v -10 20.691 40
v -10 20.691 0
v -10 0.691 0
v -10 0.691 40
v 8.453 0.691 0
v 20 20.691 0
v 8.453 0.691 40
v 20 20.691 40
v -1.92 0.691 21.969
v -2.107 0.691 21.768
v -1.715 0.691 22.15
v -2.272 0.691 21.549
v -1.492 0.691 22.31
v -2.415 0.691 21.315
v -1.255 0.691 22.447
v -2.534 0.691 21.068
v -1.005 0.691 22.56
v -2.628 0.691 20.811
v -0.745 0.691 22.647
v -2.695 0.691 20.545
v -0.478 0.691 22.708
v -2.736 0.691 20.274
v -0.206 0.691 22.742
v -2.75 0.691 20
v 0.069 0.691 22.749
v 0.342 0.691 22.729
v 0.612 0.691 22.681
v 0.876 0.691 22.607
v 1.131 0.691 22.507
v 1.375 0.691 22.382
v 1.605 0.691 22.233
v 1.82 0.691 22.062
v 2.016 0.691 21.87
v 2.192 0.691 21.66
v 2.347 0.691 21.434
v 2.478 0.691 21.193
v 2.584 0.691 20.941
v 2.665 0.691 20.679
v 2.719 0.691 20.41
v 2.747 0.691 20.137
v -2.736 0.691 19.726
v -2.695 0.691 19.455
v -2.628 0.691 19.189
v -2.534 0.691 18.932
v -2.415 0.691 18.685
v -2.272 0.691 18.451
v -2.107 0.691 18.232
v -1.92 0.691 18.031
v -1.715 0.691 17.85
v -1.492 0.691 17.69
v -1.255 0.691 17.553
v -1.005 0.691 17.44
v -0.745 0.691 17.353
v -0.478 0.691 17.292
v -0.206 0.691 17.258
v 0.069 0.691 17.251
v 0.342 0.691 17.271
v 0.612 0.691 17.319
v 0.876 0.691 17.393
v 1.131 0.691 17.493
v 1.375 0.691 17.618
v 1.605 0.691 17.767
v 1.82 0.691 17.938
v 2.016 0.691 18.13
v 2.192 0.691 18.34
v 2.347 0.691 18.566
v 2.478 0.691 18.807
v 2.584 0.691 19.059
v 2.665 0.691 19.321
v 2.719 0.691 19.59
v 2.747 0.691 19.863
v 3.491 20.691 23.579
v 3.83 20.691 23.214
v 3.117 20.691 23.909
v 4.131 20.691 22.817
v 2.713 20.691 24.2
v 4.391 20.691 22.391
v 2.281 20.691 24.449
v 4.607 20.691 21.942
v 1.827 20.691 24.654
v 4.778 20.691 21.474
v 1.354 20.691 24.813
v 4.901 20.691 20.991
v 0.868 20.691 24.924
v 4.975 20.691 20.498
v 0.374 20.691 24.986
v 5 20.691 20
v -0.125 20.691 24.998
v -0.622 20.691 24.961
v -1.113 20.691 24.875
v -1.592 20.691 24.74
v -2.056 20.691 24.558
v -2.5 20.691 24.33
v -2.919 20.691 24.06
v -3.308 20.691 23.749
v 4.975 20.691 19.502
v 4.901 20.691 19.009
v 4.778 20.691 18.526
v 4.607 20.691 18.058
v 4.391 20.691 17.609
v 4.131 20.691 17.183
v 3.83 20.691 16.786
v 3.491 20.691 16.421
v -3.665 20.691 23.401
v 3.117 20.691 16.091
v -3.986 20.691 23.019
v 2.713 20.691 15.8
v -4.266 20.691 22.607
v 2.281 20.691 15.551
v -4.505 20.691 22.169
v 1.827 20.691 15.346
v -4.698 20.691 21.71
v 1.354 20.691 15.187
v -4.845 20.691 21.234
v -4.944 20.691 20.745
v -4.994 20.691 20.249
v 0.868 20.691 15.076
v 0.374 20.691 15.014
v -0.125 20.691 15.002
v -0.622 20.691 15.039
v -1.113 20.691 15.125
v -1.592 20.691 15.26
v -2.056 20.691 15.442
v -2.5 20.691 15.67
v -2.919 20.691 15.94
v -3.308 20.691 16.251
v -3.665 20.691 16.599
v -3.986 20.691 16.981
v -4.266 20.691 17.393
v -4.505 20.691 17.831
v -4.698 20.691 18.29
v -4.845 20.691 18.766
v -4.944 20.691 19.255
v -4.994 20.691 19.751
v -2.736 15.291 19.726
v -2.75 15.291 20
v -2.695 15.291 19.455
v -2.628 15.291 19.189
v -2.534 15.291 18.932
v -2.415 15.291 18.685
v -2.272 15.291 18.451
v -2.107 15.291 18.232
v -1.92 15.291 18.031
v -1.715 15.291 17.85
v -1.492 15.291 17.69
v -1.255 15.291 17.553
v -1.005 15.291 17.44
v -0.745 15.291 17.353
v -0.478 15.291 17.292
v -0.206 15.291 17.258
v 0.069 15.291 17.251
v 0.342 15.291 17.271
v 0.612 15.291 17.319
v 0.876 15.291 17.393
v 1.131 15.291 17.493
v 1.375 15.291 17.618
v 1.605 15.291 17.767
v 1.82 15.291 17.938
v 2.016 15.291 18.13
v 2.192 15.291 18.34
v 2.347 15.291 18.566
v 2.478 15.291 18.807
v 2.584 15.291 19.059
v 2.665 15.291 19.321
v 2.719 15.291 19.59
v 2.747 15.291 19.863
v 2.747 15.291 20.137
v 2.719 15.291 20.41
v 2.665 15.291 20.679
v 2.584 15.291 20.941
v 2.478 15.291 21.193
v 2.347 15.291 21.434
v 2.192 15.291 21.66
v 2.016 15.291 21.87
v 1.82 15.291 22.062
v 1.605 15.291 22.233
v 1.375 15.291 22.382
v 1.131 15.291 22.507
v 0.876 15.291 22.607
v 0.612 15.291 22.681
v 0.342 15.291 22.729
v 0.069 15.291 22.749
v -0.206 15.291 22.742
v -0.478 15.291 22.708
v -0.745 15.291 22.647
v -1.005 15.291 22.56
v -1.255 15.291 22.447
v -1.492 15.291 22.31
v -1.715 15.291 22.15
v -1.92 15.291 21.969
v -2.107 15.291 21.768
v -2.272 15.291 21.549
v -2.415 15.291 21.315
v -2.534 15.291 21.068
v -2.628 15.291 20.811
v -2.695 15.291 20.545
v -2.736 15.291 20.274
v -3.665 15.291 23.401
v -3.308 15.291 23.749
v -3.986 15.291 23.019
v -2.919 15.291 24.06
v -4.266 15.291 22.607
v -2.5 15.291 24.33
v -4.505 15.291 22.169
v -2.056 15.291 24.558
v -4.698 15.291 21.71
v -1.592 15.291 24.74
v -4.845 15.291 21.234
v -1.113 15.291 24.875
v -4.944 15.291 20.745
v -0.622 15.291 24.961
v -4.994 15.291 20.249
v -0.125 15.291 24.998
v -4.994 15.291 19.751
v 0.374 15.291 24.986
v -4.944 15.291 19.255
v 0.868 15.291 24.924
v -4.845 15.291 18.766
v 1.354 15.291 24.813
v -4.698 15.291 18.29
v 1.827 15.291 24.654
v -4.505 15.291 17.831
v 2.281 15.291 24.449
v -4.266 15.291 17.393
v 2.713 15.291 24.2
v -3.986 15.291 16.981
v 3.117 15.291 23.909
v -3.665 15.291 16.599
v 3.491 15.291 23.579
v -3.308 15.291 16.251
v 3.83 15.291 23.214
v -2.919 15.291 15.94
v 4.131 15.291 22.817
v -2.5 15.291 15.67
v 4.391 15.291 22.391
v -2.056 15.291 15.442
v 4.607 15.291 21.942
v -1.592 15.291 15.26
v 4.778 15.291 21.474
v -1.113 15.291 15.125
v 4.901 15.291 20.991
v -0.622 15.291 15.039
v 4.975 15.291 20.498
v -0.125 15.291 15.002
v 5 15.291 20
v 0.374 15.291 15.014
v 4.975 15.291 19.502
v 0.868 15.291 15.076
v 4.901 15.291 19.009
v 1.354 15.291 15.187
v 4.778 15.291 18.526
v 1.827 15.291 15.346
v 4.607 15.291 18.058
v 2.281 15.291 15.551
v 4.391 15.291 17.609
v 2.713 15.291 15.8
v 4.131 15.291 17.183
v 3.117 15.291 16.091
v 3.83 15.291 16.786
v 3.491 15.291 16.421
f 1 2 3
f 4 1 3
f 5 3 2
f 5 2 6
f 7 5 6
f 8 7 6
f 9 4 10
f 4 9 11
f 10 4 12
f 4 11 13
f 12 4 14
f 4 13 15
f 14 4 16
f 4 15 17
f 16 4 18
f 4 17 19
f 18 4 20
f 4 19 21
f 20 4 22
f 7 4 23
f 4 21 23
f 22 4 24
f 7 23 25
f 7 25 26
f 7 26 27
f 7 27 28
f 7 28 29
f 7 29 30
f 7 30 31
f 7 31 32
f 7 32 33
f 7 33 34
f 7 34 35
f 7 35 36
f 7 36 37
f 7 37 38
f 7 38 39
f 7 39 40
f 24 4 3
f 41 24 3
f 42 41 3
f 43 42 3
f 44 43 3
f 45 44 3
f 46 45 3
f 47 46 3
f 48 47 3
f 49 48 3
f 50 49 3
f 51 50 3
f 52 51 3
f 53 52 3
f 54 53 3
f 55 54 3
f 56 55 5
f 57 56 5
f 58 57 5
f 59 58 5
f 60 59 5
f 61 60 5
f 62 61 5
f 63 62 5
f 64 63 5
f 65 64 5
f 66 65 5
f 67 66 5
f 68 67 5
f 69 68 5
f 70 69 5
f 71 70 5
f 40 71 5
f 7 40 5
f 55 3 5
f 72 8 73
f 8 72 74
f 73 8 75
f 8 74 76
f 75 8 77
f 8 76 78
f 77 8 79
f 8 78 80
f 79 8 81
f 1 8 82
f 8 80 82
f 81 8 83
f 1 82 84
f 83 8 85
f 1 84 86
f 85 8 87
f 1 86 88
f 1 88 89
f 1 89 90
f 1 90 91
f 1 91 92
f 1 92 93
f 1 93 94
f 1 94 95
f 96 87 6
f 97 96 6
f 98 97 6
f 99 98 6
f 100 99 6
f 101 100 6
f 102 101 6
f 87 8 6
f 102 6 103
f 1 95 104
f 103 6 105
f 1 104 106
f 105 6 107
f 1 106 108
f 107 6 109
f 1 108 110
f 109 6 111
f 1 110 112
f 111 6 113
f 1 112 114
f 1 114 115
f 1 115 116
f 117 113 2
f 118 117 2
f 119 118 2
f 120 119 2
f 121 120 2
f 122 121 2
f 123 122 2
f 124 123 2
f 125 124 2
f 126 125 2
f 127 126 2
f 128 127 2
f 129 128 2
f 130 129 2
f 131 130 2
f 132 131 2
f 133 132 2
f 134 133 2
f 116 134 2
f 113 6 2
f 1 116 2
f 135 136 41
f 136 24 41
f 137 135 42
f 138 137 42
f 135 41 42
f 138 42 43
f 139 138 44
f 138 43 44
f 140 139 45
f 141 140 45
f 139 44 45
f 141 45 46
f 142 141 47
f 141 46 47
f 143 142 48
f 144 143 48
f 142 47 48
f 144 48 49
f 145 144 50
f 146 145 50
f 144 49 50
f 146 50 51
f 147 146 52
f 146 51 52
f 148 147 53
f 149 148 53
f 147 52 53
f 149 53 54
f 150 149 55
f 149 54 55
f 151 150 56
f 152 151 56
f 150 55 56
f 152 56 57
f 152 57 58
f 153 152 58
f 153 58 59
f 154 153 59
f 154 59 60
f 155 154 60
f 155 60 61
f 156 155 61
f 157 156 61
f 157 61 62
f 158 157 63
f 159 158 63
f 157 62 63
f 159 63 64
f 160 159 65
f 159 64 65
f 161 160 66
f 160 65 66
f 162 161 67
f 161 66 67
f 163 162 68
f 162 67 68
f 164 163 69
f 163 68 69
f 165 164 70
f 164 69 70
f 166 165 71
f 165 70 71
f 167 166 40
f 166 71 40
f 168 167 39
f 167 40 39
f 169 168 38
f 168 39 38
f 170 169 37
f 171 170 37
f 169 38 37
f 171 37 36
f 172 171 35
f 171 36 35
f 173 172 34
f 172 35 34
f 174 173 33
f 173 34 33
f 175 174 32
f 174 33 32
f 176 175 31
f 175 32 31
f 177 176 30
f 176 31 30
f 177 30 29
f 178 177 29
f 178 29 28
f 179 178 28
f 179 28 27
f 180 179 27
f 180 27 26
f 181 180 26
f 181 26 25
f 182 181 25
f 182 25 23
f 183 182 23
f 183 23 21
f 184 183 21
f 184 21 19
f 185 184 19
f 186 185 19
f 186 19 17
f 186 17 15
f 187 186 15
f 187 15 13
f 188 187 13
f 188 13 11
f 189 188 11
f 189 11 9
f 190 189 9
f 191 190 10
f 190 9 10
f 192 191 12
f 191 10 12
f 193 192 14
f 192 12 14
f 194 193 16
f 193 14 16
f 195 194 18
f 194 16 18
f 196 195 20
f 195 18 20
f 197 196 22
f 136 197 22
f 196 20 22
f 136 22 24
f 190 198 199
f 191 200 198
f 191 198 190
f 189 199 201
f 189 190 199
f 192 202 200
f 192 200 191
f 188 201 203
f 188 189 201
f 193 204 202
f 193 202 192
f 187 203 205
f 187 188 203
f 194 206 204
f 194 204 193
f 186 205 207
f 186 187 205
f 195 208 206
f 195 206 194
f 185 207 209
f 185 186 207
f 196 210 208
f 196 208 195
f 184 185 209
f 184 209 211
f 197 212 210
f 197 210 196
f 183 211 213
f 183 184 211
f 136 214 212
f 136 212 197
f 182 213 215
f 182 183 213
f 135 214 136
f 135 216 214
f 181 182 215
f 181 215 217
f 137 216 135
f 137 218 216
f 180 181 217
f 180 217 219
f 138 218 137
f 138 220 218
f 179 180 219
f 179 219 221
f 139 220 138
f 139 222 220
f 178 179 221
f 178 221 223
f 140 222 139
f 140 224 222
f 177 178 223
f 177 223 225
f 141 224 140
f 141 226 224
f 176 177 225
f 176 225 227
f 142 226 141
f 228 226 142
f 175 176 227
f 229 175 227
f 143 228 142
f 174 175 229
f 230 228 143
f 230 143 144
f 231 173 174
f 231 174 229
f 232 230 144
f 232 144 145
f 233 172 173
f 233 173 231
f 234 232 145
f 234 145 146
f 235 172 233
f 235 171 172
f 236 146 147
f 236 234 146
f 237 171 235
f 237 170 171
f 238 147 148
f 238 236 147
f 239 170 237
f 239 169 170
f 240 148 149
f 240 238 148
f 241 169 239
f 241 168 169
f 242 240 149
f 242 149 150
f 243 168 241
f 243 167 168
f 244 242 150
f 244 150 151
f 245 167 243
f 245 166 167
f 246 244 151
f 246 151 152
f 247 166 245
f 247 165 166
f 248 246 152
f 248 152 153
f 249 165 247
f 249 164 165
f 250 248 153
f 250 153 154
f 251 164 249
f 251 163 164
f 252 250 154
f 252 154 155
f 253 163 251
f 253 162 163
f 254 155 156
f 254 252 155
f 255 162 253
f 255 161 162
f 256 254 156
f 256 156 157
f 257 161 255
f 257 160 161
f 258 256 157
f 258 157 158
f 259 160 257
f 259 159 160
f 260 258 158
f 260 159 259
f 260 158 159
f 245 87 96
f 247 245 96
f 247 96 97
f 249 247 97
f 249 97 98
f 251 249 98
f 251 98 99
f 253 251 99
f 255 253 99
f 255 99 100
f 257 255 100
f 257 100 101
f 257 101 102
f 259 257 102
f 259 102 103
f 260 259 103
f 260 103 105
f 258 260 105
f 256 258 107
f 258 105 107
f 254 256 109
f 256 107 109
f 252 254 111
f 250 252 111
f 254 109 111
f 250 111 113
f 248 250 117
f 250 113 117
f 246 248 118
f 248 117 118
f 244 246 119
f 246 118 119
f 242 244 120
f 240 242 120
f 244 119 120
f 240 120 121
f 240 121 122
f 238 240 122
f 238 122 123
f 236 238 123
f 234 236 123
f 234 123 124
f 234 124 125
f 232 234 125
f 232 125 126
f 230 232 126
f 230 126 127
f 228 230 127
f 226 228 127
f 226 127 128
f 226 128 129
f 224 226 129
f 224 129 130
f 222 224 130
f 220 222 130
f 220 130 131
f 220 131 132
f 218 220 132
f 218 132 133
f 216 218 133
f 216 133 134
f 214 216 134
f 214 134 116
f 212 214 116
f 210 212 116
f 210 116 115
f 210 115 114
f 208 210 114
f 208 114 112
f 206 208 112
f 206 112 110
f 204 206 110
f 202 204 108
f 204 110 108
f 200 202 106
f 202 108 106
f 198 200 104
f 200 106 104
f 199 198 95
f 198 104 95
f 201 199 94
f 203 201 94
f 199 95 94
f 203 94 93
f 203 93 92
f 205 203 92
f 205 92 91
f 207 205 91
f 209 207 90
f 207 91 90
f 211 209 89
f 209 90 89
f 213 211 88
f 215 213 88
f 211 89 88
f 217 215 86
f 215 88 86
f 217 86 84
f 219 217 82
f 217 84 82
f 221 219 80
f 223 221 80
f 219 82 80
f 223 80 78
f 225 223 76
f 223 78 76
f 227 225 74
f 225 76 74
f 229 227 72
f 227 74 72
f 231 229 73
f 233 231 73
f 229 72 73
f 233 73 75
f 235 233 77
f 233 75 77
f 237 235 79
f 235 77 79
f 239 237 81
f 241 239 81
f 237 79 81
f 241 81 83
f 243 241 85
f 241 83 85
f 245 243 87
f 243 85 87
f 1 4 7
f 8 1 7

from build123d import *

# Parameters (mm, degrees)
BOSS_EXTRU_1_DEPTH                                 = 40
CHAMBRAGE_POUR_VIS_T_TE_HEXAGONALE_M51_D           = 5.5
CHAMBRAGE_POUR_VIS_T_TE_HEXAGONALE_M51_CBORE_D     = 10
CHAMBRAGE_POUR_VIS_T_TE_HEXAGONALE_M51_CBORE_DEPTH = 5.4


with BuildPart() as part:
    # Esquisse1 → Boss.-Extru.1 (new body)
    with BuildSketch(Plane.XY):
        Polygon((-10, 0.691167323), (8.452994616, 0.691167323), (20, 20.691167323), (-10, 20.691167323), align=None)
    extrude(amount=BOSS_EXTRU_1_DEPTH)

    # Chambrage pour vis à tête hexagonale M51 (through all)
    with Locations(Plane(origin=(0, 20.691167323, 0), x_dir=(1, 0, 0), z_dir=(0, 1, 0))):
        with Locations((0, -20)):
            CounterBoreHole(CHAMBRAGE_POUR_VIS_T_TE_HEXAGONALE_M51_D / 2, CHAMBRAGE_POUR_VIS_T_TE_HEXAGONALE_M51_CBORE_D / 2, CHAMBRAGE_POUR_VIS_T_TE_HEXAGONALE_M51_CBORE_DEPTH)


solid = part.part
